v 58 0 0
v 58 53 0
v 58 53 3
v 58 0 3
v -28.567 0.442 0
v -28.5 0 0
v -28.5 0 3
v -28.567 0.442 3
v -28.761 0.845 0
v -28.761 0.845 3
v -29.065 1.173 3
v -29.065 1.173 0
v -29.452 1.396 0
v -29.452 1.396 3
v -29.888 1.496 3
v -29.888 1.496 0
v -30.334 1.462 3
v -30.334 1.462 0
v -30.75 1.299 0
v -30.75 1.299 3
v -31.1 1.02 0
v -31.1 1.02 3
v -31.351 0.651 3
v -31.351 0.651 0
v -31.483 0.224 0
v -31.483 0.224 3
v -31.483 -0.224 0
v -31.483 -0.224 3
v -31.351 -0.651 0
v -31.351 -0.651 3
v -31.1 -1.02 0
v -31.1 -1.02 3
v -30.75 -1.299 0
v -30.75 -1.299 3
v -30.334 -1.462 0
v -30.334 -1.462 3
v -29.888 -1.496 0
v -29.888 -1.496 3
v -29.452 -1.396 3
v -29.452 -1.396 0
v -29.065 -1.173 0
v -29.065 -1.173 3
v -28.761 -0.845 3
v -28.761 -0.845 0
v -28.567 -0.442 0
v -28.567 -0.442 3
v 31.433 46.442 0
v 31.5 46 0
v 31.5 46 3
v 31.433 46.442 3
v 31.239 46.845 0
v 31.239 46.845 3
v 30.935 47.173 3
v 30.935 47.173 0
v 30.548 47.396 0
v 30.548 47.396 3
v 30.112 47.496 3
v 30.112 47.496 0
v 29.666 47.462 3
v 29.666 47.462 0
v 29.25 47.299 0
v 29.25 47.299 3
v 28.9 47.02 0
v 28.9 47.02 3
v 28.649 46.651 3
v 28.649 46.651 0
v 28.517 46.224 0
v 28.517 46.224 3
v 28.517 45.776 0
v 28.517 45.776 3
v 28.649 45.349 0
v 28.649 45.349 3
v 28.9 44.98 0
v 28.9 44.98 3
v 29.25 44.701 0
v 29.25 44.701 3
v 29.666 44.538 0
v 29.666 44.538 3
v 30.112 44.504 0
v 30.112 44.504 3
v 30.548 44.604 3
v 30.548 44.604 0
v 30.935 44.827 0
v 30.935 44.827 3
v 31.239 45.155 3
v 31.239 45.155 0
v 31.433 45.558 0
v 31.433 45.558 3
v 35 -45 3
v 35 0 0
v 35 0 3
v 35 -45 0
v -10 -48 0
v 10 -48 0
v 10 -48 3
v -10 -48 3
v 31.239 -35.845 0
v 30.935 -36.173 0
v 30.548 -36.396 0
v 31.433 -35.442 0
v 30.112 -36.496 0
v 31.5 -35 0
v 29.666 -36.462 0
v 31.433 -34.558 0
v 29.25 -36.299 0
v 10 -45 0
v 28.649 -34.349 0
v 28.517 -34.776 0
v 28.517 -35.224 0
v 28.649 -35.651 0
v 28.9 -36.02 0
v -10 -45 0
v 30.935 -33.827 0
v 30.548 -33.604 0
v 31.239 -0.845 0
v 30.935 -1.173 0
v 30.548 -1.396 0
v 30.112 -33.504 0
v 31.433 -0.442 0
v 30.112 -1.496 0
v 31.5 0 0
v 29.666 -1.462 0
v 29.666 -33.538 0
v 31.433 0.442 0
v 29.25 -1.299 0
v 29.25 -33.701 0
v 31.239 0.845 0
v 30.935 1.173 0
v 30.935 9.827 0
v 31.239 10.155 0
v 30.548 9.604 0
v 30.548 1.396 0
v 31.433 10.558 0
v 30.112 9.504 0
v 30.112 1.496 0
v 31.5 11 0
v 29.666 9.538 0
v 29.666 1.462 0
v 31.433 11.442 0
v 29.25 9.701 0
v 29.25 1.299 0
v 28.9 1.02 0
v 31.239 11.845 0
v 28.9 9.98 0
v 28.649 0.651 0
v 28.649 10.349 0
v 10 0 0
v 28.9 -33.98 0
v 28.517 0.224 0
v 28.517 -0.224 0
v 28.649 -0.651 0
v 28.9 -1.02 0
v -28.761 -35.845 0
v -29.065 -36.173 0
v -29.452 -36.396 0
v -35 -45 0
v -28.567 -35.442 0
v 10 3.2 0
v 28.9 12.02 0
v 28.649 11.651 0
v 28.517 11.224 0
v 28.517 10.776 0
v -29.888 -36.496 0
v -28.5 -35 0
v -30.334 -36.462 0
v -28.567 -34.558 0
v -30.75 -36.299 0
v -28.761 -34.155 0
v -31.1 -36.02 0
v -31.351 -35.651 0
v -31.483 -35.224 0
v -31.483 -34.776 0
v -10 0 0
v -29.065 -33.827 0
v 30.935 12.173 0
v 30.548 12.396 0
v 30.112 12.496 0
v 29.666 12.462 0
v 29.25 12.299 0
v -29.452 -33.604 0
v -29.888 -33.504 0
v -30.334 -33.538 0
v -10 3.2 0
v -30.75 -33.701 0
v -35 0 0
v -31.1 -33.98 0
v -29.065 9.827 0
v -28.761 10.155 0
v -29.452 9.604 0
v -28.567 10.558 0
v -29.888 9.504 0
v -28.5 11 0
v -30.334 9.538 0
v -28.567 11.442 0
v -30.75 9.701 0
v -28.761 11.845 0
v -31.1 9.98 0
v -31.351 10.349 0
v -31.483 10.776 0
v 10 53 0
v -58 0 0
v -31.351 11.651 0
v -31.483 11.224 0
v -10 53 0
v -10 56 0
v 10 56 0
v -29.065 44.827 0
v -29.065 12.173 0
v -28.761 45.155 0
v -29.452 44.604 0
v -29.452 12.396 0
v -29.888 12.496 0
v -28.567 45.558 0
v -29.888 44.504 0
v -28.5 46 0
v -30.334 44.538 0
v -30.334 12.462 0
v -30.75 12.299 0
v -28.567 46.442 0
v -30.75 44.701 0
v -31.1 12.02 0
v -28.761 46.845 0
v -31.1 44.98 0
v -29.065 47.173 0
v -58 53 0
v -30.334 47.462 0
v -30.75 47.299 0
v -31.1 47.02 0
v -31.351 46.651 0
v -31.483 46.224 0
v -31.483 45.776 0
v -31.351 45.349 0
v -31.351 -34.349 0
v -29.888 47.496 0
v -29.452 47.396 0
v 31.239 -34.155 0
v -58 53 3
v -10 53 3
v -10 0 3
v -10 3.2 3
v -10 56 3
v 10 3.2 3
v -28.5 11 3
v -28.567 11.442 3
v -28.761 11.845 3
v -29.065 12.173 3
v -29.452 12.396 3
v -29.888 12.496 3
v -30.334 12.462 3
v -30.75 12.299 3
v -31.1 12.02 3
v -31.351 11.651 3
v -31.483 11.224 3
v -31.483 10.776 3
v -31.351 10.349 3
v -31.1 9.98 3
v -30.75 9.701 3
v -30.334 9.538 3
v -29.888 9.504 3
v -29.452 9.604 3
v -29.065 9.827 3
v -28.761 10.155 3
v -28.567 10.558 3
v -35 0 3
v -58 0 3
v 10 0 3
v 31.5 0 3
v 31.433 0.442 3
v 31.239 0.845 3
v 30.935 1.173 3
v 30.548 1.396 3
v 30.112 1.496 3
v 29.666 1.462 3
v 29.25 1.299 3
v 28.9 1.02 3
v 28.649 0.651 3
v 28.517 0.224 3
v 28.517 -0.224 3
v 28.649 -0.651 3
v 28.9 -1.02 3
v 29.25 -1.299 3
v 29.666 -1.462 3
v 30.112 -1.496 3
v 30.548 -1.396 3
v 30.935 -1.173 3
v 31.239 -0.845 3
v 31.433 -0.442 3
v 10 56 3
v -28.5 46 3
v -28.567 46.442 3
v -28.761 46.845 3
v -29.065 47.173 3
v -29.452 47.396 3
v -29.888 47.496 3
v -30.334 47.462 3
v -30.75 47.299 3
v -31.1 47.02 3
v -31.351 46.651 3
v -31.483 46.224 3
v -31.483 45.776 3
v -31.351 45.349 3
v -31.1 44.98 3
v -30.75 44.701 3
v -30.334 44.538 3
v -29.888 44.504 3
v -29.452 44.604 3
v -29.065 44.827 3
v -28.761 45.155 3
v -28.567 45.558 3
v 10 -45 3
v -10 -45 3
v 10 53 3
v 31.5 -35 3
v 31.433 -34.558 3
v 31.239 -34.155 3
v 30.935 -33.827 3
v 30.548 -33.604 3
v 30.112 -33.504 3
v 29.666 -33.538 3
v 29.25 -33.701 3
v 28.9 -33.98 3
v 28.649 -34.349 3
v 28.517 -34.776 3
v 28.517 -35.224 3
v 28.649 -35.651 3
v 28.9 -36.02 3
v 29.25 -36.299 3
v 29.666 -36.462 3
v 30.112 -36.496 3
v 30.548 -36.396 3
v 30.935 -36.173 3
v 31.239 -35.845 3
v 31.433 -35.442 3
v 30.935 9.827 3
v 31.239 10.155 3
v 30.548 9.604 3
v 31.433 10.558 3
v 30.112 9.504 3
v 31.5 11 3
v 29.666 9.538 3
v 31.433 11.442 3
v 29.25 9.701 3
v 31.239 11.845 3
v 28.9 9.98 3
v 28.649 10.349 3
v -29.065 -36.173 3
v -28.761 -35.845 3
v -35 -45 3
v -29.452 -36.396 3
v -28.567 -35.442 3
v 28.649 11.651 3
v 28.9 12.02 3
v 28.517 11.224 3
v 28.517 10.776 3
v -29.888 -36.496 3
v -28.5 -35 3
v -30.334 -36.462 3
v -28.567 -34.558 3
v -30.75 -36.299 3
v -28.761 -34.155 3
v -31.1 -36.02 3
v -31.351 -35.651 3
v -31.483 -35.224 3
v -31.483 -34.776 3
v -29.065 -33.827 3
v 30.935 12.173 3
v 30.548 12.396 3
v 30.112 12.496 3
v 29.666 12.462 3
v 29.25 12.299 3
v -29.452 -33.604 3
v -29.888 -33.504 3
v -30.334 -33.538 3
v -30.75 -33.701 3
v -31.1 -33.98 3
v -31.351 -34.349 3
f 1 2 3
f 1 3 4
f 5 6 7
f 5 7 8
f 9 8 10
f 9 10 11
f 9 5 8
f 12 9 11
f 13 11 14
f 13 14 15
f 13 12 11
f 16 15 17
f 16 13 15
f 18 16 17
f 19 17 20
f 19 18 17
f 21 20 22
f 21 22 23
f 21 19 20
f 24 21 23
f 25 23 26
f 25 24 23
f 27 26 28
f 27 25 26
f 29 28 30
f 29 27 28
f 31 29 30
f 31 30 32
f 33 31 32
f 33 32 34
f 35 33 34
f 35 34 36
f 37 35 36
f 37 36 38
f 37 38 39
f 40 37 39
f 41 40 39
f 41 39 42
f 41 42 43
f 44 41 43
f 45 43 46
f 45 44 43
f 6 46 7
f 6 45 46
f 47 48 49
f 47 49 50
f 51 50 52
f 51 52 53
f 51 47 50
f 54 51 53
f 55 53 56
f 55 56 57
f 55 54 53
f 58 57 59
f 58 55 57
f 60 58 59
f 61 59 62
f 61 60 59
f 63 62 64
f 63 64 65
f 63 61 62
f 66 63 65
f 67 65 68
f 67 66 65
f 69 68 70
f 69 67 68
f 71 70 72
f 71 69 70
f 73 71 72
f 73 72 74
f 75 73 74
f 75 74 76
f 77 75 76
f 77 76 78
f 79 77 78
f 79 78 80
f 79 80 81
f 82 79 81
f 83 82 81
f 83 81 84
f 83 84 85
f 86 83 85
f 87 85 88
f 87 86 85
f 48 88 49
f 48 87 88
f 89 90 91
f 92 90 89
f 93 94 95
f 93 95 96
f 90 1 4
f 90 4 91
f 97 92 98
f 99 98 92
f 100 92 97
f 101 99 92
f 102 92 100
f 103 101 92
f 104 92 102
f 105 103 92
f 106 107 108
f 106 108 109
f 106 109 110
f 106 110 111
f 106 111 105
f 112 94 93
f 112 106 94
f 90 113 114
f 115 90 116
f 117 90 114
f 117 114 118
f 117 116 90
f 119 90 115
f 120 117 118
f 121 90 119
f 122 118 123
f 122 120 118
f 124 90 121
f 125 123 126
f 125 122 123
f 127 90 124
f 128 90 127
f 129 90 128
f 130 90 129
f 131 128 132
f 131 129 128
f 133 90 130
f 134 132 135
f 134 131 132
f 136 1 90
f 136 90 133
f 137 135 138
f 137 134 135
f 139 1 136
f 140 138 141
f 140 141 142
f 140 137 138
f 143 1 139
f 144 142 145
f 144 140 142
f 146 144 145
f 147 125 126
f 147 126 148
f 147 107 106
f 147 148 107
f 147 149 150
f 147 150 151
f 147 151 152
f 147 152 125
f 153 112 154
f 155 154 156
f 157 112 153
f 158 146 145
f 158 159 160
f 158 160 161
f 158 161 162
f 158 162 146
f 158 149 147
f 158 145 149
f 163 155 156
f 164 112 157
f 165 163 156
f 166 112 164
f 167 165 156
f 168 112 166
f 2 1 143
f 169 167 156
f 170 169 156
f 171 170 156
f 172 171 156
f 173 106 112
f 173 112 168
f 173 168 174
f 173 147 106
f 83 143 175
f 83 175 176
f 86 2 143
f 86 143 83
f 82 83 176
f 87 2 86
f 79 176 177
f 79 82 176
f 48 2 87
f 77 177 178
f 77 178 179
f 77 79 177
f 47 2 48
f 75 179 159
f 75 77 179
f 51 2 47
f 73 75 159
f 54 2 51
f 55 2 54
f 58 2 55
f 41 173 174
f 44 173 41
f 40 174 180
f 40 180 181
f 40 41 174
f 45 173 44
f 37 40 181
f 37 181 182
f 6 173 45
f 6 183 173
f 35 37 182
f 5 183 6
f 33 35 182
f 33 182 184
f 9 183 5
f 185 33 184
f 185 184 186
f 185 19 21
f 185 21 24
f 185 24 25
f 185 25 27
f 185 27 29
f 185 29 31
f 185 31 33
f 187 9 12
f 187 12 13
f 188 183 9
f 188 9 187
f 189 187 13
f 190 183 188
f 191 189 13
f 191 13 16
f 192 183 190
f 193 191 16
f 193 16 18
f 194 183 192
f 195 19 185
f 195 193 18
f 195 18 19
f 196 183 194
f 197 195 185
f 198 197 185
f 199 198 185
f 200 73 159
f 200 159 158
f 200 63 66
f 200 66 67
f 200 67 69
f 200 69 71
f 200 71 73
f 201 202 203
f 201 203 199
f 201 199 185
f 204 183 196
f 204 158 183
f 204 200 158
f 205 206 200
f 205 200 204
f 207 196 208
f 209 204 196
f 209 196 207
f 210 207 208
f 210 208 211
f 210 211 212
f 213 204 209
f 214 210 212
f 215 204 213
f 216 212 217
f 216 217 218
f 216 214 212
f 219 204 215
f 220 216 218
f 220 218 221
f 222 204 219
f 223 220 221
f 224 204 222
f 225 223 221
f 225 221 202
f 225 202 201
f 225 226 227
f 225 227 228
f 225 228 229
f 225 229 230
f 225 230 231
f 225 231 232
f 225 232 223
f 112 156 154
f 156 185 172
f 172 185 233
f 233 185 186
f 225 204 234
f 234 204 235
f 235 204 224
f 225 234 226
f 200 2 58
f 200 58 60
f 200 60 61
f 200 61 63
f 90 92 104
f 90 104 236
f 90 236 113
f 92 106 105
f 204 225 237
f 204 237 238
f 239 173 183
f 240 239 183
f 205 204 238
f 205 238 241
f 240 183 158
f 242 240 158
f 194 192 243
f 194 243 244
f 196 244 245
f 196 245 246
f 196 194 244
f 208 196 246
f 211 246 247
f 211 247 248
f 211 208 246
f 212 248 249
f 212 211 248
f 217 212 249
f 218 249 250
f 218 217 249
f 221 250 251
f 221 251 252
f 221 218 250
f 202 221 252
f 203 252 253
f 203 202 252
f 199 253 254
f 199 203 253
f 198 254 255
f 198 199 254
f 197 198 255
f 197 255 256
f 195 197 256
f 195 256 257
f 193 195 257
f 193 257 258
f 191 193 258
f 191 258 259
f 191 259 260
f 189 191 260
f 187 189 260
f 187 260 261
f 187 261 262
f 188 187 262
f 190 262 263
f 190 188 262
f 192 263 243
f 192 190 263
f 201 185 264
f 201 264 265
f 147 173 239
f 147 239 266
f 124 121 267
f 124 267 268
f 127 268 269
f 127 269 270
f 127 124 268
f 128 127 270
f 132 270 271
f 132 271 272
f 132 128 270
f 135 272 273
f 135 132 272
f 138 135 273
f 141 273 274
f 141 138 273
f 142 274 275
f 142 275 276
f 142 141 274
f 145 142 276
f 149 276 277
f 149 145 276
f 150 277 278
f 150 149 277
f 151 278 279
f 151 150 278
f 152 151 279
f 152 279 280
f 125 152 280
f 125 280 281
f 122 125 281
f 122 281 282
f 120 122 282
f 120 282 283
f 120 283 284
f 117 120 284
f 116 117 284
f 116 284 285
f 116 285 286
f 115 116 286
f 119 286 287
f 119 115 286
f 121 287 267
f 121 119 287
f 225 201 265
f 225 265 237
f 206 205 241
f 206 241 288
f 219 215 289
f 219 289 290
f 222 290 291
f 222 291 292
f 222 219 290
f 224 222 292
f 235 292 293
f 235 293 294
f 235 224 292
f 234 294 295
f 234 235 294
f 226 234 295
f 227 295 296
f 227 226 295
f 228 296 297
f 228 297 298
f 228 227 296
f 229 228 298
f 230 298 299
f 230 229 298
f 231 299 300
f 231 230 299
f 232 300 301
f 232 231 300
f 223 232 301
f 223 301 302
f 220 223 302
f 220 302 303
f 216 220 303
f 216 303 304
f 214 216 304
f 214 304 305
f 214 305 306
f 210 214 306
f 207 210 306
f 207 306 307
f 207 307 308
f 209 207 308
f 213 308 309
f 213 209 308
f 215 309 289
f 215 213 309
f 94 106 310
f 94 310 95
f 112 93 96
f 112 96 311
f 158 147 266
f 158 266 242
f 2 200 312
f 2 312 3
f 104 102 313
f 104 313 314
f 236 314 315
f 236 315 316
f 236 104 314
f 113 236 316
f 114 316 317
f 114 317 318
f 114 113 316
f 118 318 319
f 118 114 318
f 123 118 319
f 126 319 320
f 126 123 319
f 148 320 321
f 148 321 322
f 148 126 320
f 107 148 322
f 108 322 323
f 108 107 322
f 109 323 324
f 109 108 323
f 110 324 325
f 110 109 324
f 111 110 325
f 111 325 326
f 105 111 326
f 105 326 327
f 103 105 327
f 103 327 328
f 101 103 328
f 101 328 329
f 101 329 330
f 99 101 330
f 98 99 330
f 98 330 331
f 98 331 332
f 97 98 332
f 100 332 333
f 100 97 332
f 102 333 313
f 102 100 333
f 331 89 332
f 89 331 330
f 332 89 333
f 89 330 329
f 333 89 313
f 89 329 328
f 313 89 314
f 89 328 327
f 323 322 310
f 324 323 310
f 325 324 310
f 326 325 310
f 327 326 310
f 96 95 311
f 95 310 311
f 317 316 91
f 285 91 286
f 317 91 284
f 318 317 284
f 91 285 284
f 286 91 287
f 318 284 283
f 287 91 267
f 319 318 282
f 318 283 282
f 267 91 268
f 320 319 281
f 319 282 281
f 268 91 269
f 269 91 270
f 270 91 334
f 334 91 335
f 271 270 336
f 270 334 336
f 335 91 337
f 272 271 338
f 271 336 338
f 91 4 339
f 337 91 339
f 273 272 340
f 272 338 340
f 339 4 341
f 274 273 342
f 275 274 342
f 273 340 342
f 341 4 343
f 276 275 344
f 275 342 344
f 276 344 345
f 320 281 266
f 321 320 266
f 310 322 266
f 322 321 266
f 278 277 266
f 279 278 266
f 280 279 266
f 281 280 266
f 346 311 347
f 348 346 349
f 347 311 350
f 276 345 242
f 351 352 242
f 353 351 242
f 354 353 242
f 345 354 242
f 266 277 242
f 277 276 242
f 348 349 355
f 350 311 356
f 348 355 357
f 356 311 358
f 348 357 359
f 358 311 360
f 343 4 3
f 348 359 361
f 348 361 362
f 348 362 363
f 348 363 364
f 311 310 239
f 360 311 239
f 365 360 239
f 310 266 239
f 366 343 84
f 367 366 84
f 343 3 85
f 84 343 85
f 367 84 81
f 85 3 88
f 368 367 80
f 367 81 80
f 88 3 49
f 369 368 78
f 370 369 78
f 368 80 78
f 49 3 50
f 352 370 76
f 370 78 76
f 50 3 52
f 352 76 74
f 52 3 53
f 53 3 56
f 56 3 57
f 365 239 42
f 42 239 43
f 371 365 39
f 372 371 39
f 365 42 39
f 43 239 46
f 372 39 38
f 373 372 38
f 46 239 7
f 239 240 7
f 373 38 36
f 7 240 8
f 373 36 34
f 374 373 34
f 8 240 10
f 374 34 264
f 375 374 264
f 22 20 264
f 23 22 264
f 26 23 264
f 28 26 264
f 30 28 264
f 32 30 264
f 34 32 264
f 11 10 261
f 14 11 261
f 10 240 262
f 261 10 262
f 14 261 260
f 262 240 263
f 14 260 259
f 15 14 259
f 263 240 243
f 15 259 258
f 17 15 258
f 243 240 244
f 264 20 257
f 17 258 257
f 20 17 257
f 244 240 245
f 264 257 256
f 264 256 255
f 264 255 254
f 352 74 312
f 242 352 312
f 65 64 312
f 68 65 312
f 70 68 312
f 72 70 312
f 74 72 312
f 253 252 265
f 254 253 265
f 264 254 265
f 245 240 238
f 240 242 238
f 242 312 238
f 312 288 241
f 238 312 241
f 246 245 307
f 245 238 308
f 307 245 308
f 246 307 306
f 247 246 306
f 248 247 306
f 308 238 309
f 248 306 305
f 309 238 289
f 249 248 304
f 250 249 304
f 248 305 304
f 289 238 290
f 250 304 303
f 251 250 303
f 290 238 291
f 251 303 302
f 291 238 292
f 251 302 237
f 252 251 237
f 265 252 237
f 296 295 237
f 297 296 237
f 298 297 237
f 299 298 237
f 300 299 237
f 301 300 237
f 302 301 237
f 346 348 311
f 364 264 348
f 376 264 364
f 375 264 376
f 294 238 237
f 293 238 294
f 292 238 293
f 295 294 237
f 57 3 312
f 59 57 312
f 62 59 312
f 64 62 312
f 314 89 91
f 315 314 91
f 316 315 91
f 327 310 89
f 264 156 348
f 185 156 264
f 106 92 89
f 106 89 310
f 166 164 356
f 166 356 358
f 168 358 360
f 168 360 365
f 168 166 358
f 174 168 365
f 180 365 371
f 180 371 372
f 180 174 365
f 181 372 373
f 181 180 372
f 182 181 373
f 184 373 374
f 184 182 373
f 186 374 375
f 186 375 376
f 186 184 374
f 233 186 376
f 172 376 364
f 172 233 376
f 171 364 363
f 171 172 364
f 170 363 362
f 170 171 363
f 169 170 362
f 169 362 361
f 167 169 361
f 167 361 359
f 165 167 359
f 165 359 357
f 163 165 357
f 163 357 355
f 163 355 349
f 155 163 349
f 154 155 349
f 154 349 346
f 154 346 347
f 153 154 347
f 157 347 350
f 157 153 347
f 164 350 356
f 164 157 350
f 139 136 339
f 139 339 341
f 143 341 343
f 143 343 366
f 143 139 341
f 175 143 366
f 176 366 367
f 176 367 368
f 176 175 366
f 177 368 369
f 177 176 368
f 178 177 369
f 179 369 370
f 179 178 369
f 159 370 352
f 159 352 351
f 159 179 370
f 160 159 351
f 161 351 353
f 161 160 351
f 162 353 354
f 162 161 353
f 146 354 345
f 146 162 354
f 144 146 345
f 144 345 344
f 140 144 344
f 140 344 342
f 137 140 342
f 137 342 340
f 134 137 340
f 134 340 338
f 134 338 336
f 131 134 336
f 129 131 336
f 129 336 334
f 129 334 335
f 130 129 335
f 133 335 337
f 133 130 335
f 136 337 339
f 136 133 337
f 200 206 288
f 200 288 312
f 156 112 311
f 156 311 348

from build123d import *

# Parameters (mm, degrees)
SKETCH1_R           = 1.5
SKETCH1_W           = 20
SKETCH1_H           = 3.2
BOSS_EXTRUDE1_DEPTH = 3


with BuildPart() as part:
    # Sketch1 → Boss-Extrude1 (new body)
    with BuildSketch(Plane.XY):
        Polygon((10, -48), (-10, -48), (-10, -45), (-35, -45), (-35, 0), (-58, 0), (-58, 53), (-10, 53), (-10, 56), (10, 56), (10, 53), (58, 53), (58, 0), (35, 0), (35, -45), (10, -45), align=None)
        with Locations((-30, 0)):
            Circle(SKETCH1_R, mode=Mode.SUBTRACT)
        with Locations((-30, -35)):
            Circle(SKETCH1_R, mode=Mode.SUBTRACT)
        with Locations((30, 0)):
            Circle(SKETCH1_R, mode=Mode.SUBTRACT)
        with Locations((30, -35)):
            Circle(SKETCH1_R, mode=Mode.SUBTRACT)
        with Locations((-30, 11)):
            Circle(SKETCH1_R, mode=Mode.SUBTRACT)
        with Locations((-30, 46)):
            Circle(SKETCH1_R, mode=Mode.SUBTRACT)
        with Locations((30, 46)):
            Circle(SKETCH1_R, mode=Mode.SUBTRACT)
        with Locations((30, 11)):
            Circle(SKETCH1_R, mode=Mode.SUBTRACT)
        with Locations((0, 1.6)):
            Rectangle(SKETCH1_W, SKETCH1_H, mode=Mode.SUBTRACT)
    extrude(amount=BOSS_EXTRUDE1_DEPTH)


solid = part.part
